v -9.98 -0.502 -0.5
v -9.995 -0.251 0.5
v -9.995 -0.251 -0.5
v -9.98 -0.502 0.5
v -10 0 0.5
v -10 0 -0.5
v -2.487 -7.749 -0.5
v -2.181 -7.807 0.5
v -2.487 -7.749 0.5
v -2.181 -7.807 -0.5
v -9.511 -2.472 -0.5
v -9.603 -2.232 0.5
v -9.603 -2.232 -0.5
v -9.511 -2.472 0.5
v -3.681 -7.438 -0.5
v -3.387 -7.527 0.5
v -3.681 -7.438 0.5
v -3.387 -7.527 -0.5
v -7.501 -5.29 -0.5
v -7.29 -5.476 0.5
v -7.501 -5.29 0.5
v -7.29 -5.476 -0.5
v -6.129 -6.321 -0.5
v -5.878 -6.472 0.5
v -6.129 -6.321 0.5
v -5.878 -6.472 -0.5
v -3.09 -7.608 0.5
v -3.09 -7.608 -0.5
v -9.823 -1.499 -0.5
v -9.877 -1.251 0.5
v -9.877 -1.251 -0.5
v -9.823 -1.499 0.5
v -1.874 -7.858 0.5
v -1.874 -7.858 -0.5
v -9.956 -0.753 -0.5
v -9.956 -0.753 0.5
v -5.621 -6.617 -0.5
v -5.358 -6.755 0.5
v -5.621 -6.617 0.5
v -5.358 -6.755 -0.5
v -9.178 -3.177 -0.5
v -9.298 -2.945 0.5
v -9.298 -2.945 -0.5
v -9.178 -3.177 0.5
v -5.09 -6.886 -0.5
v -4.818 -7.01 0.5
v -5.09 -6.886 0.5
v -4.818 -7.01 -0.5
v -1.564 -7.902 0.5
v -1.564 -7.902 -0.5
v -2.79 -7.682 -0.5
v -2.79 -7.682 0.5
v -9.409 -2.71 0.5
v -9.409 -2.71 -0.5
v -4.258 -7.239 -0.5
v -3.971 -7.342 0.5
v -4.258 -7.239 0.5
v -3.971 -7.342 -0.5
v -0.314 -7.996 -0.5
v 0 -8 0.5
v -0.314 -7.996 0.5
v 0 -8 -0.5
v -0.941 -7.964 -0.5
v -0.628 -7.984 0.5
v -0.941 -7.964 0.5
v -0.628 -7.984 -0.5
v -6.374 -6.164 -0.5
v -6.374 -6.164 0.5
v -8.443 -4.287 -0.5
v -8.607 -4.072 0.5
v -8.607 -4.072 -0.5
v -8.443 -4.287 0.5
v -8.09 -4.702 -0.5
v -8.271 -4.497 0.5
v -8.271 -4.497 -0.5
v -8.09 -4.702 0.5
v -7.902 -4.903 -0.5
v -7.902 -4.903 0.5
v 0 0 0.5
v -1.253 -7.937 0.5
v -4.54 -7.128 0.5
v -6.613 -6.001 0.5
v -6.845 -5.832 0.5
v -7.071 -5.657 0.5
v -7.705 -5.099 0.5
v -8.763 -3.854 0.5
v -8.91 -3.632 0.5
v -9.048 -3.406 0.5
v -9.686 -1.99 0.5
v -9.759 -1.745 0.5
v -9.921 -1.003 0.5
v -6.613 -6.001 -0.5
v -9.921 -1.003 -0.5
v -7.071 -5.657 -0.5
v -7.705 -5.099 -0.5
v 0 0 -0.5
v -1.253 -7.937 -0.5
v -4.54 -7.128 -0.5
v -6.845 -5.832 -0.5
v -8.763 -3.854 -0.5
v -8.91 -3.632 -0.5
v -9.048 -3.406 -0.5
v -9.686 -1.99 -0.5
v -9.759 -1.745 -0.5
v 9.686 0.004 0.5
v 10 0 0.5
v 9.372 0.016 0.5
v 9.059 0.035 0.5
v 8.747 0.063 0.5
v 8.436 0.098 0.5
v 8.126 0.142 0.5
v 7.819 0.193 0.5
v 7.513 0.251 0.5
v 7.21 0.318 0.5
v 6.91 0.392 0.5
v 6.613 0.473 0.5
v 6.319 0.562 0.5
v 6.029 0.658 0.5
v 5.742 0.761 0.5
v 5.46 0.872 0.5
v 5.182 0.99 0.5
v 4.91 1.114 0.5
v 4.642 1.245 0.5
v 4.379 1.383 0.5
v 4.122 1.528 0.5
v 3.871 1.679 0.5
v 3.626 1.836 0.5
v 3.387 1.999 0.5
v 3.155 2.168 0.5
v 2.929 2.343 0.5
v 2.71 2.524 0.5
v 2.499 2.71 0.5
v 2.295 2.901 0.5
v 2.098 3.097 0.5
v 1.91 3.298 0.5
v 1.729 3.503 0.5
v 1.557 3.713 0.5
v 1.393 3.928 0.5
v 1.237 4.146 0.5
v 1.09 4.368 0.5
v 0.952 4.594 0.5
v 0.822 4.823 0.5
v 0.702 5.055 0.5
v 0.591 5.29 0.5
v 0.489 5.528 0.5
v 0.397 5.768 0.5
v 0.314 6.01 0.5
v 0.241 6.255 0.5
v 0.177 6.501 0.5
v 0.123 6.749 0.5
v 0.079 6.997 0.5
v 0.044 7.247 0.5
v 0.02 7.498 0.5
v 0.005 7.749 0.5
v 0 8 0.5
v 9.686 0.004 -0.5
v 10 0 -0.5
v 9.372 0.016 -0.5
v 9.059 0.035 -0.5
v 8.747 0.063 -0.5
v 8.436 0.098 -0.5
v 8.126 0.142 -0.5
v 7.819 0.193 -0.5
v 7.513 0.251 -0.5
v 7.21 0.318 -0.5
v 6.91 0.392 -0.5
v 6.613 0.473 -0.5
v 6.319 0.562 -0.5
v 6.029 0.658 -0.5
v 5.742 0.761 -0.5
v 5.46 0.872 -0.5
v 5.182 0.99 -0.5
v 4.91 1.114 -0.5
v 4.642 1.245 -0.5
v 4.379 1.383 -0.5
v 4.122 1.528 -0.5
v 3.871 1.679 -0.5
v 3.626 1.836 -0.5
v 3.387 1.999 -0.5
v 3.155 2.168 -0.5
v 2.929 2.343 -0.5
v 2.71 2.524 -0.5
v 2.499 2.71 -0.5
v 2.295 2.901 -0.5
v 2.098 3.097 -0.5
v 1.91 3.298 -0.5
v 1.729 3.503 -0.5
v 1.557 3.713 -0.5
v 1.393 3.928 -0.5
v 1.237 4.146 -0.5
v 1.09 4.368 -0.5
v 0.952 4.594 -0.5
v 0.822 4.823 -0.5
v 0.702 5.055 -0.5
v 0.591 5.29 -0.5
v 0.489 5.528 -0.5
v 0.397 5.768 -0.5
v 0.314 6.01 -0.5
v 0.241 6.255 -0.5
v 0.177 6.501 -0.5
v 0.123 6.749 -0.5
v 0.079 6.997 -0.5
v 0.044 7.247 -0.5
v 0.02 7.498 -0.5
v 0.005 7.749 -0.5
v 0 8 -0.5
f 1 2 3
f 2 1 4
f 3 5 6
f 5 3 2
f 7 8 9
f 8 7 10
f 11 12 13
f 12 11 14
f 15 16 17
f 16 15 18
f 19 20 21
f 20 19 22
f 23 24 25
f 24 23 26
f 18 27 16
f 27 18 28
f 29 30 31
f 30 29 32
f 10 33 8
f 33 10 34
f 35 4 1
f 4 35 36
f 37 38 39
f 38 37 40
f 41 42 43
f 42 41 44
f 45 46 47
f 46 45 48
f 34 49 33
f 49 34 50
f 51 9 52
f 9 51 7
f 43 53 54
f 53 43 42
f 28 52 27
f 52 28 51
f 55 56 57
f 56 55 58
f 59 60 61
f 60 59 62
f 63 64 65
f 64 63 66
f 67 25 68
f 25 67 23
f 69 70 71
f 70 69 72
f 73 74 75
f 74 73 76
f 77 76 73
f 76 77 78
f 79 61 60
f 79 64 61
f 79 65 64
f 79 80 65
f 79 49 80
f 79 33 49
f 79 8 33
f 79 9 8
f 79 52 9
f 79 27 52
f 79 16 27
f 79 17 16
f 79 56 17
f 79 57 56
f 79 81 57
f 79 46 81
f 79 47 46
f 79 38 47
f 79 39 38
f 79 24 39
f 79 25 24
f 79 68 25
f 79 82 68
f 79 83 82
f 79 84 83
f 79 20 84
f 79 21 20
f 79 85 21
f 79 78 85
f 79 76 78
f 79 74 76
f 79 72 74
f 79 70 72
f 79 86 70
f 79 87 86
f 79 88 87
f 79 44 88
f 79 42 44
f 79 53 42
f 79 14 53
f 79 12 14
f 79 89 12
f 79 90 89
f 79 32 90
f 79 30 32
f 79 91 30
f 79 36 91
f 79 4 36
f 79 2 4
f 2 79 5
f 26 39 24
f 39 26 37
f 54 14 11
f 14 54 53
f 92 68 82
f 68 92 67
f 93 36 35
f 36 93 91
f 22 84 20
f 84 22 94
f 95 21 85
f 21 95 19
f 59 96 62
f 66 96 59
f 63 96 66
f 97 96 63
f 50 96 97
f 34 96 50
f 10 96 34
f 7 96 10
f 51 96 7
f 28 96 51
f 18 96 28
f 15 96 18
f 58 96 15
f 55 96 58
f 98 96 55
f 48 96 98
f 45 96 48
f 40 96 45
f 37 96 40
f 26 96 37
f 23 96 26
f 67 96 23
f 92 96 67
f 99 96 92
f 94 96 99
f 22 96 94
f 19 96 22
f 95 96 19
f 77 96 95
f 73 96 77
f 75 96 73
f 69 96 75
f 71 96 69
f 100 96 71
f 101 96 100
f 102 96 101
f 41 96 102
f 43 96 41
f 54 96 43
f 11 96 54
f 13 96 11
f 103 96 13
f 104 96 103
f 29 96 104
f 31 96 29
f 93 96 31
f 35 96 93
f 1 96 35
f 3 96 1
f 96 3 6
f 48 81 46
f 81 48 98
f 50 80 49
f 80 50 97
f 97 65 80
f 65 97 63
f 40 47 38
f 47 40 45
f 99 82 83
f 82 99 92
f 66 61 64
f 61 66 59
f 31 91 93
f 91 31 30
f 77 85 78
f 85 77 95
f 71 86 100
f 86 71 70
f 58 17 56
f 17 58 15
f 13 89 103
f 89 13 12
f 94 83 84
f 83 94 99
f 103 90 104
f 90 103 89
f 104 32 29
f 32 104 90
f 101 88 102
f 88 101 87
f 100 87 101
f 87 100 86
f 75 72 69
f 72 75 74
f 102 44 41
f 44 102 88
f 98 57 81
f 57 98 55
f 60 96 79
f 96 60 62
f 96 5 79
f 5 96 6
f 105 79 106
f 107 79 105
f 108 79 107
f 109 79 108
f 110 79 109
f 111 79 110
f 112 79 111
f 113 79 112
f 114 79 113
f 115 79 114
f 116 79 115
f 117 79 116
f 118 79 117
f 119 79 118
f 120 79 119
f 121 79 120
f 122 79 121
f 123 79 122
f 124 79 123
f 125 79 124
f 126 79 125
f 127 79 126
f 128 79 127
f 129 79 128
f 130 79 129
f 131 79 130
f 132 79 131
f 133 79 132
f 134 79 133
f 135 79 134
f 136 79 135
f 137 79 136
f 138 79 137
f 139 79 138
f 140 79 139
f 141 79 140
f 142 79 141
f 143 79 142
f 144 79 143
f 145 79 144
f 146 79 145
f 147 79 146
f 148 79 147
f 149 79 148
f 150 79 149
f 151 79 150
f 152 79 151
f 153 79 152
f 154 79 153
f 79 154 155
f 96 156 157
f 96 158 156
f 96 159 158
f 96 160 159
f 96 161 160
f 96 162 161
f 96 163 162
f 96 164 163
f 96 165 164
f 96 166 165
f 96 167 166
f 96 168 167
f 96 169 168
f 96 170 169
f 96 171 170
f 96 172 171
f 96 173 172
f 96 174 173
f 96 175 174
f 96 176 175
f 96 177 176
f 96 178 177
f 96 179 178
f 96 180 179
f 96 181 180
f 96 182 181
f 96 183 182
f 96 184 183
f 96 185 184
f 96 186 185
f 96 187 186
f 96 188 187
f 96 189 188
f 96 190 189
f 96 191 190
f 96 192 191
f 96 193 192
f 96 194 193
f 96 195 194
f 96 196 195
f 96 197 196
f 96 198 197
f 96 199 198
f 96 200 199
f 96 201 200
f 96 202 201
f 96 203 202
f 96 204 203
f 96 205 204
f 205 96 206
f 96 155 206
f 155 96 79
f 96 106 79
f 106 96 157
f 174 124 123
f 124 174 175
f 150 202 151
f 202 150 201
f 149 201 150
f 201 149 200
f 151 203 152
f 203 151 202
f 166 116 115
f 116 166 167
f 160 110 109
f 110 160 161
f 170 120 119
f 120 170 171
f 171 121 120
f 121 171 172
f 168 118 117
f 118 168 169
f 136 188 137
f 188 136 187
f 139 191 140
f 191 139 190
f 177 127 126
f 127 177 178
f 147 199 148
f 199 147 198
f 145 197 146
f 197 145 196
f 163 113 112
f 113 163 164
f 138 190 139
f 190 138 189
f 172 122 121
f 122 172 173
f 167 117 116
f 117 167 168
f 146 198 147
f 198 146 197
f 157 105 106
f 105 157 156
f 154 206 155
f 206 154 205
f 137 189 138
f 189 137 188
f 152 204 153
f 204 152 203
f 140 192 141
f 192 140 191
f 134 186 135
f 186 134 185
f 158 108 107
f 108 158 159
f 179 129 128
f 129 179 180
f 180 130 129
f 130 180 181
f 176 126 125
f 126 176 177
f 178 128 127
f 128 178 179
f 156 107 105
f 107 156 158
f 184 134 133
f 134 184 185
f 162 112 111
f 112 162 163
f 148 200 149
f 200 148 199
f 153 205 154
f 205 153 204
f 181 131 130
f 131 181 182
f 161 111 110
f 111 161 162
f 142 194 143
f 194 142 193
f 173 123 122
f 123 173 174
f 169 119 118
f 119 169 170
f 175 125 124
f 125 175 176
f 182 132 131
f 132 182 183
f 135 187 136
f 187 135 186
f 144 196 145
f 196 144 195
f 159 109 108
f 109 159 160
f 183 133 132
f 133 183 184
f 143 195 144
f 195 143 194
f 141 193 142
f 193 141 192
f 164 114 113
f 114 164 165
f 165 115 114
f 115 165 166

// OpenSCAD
$fn = 200;
nothing = 0.05;

/**
 * @brief Draws a round corner in the XY plane.
 */
module round_corner_outside(x=1, y=1, z=1)
{
    scale([x, y, 1])
    translate([0, 0, -z/2])
    intersection()
    {
        // full circle
        linear_extrude(z)
        circle(1);

        // x >= 0; y >= 0;
        cube([x, y, z]);
    }
}

/**
 * @brief Draws a round corner in the XY plane.
 */
module round_corner_inside(x=1, y=1, z=1)
{
    scale([x, y, z])
    translate([0, 0, -1/2])
    difference()
    {
        // x >= 0; y >= 0;
        cube([1, 1, 1]);

        translate([1, 1, -nothing/2])
        linear_extrude(1 + nothing)
        circle(1);
    }
}

rotate(180)
round_corner_outside(10, 8);

round_corner_inside(10, 8);
